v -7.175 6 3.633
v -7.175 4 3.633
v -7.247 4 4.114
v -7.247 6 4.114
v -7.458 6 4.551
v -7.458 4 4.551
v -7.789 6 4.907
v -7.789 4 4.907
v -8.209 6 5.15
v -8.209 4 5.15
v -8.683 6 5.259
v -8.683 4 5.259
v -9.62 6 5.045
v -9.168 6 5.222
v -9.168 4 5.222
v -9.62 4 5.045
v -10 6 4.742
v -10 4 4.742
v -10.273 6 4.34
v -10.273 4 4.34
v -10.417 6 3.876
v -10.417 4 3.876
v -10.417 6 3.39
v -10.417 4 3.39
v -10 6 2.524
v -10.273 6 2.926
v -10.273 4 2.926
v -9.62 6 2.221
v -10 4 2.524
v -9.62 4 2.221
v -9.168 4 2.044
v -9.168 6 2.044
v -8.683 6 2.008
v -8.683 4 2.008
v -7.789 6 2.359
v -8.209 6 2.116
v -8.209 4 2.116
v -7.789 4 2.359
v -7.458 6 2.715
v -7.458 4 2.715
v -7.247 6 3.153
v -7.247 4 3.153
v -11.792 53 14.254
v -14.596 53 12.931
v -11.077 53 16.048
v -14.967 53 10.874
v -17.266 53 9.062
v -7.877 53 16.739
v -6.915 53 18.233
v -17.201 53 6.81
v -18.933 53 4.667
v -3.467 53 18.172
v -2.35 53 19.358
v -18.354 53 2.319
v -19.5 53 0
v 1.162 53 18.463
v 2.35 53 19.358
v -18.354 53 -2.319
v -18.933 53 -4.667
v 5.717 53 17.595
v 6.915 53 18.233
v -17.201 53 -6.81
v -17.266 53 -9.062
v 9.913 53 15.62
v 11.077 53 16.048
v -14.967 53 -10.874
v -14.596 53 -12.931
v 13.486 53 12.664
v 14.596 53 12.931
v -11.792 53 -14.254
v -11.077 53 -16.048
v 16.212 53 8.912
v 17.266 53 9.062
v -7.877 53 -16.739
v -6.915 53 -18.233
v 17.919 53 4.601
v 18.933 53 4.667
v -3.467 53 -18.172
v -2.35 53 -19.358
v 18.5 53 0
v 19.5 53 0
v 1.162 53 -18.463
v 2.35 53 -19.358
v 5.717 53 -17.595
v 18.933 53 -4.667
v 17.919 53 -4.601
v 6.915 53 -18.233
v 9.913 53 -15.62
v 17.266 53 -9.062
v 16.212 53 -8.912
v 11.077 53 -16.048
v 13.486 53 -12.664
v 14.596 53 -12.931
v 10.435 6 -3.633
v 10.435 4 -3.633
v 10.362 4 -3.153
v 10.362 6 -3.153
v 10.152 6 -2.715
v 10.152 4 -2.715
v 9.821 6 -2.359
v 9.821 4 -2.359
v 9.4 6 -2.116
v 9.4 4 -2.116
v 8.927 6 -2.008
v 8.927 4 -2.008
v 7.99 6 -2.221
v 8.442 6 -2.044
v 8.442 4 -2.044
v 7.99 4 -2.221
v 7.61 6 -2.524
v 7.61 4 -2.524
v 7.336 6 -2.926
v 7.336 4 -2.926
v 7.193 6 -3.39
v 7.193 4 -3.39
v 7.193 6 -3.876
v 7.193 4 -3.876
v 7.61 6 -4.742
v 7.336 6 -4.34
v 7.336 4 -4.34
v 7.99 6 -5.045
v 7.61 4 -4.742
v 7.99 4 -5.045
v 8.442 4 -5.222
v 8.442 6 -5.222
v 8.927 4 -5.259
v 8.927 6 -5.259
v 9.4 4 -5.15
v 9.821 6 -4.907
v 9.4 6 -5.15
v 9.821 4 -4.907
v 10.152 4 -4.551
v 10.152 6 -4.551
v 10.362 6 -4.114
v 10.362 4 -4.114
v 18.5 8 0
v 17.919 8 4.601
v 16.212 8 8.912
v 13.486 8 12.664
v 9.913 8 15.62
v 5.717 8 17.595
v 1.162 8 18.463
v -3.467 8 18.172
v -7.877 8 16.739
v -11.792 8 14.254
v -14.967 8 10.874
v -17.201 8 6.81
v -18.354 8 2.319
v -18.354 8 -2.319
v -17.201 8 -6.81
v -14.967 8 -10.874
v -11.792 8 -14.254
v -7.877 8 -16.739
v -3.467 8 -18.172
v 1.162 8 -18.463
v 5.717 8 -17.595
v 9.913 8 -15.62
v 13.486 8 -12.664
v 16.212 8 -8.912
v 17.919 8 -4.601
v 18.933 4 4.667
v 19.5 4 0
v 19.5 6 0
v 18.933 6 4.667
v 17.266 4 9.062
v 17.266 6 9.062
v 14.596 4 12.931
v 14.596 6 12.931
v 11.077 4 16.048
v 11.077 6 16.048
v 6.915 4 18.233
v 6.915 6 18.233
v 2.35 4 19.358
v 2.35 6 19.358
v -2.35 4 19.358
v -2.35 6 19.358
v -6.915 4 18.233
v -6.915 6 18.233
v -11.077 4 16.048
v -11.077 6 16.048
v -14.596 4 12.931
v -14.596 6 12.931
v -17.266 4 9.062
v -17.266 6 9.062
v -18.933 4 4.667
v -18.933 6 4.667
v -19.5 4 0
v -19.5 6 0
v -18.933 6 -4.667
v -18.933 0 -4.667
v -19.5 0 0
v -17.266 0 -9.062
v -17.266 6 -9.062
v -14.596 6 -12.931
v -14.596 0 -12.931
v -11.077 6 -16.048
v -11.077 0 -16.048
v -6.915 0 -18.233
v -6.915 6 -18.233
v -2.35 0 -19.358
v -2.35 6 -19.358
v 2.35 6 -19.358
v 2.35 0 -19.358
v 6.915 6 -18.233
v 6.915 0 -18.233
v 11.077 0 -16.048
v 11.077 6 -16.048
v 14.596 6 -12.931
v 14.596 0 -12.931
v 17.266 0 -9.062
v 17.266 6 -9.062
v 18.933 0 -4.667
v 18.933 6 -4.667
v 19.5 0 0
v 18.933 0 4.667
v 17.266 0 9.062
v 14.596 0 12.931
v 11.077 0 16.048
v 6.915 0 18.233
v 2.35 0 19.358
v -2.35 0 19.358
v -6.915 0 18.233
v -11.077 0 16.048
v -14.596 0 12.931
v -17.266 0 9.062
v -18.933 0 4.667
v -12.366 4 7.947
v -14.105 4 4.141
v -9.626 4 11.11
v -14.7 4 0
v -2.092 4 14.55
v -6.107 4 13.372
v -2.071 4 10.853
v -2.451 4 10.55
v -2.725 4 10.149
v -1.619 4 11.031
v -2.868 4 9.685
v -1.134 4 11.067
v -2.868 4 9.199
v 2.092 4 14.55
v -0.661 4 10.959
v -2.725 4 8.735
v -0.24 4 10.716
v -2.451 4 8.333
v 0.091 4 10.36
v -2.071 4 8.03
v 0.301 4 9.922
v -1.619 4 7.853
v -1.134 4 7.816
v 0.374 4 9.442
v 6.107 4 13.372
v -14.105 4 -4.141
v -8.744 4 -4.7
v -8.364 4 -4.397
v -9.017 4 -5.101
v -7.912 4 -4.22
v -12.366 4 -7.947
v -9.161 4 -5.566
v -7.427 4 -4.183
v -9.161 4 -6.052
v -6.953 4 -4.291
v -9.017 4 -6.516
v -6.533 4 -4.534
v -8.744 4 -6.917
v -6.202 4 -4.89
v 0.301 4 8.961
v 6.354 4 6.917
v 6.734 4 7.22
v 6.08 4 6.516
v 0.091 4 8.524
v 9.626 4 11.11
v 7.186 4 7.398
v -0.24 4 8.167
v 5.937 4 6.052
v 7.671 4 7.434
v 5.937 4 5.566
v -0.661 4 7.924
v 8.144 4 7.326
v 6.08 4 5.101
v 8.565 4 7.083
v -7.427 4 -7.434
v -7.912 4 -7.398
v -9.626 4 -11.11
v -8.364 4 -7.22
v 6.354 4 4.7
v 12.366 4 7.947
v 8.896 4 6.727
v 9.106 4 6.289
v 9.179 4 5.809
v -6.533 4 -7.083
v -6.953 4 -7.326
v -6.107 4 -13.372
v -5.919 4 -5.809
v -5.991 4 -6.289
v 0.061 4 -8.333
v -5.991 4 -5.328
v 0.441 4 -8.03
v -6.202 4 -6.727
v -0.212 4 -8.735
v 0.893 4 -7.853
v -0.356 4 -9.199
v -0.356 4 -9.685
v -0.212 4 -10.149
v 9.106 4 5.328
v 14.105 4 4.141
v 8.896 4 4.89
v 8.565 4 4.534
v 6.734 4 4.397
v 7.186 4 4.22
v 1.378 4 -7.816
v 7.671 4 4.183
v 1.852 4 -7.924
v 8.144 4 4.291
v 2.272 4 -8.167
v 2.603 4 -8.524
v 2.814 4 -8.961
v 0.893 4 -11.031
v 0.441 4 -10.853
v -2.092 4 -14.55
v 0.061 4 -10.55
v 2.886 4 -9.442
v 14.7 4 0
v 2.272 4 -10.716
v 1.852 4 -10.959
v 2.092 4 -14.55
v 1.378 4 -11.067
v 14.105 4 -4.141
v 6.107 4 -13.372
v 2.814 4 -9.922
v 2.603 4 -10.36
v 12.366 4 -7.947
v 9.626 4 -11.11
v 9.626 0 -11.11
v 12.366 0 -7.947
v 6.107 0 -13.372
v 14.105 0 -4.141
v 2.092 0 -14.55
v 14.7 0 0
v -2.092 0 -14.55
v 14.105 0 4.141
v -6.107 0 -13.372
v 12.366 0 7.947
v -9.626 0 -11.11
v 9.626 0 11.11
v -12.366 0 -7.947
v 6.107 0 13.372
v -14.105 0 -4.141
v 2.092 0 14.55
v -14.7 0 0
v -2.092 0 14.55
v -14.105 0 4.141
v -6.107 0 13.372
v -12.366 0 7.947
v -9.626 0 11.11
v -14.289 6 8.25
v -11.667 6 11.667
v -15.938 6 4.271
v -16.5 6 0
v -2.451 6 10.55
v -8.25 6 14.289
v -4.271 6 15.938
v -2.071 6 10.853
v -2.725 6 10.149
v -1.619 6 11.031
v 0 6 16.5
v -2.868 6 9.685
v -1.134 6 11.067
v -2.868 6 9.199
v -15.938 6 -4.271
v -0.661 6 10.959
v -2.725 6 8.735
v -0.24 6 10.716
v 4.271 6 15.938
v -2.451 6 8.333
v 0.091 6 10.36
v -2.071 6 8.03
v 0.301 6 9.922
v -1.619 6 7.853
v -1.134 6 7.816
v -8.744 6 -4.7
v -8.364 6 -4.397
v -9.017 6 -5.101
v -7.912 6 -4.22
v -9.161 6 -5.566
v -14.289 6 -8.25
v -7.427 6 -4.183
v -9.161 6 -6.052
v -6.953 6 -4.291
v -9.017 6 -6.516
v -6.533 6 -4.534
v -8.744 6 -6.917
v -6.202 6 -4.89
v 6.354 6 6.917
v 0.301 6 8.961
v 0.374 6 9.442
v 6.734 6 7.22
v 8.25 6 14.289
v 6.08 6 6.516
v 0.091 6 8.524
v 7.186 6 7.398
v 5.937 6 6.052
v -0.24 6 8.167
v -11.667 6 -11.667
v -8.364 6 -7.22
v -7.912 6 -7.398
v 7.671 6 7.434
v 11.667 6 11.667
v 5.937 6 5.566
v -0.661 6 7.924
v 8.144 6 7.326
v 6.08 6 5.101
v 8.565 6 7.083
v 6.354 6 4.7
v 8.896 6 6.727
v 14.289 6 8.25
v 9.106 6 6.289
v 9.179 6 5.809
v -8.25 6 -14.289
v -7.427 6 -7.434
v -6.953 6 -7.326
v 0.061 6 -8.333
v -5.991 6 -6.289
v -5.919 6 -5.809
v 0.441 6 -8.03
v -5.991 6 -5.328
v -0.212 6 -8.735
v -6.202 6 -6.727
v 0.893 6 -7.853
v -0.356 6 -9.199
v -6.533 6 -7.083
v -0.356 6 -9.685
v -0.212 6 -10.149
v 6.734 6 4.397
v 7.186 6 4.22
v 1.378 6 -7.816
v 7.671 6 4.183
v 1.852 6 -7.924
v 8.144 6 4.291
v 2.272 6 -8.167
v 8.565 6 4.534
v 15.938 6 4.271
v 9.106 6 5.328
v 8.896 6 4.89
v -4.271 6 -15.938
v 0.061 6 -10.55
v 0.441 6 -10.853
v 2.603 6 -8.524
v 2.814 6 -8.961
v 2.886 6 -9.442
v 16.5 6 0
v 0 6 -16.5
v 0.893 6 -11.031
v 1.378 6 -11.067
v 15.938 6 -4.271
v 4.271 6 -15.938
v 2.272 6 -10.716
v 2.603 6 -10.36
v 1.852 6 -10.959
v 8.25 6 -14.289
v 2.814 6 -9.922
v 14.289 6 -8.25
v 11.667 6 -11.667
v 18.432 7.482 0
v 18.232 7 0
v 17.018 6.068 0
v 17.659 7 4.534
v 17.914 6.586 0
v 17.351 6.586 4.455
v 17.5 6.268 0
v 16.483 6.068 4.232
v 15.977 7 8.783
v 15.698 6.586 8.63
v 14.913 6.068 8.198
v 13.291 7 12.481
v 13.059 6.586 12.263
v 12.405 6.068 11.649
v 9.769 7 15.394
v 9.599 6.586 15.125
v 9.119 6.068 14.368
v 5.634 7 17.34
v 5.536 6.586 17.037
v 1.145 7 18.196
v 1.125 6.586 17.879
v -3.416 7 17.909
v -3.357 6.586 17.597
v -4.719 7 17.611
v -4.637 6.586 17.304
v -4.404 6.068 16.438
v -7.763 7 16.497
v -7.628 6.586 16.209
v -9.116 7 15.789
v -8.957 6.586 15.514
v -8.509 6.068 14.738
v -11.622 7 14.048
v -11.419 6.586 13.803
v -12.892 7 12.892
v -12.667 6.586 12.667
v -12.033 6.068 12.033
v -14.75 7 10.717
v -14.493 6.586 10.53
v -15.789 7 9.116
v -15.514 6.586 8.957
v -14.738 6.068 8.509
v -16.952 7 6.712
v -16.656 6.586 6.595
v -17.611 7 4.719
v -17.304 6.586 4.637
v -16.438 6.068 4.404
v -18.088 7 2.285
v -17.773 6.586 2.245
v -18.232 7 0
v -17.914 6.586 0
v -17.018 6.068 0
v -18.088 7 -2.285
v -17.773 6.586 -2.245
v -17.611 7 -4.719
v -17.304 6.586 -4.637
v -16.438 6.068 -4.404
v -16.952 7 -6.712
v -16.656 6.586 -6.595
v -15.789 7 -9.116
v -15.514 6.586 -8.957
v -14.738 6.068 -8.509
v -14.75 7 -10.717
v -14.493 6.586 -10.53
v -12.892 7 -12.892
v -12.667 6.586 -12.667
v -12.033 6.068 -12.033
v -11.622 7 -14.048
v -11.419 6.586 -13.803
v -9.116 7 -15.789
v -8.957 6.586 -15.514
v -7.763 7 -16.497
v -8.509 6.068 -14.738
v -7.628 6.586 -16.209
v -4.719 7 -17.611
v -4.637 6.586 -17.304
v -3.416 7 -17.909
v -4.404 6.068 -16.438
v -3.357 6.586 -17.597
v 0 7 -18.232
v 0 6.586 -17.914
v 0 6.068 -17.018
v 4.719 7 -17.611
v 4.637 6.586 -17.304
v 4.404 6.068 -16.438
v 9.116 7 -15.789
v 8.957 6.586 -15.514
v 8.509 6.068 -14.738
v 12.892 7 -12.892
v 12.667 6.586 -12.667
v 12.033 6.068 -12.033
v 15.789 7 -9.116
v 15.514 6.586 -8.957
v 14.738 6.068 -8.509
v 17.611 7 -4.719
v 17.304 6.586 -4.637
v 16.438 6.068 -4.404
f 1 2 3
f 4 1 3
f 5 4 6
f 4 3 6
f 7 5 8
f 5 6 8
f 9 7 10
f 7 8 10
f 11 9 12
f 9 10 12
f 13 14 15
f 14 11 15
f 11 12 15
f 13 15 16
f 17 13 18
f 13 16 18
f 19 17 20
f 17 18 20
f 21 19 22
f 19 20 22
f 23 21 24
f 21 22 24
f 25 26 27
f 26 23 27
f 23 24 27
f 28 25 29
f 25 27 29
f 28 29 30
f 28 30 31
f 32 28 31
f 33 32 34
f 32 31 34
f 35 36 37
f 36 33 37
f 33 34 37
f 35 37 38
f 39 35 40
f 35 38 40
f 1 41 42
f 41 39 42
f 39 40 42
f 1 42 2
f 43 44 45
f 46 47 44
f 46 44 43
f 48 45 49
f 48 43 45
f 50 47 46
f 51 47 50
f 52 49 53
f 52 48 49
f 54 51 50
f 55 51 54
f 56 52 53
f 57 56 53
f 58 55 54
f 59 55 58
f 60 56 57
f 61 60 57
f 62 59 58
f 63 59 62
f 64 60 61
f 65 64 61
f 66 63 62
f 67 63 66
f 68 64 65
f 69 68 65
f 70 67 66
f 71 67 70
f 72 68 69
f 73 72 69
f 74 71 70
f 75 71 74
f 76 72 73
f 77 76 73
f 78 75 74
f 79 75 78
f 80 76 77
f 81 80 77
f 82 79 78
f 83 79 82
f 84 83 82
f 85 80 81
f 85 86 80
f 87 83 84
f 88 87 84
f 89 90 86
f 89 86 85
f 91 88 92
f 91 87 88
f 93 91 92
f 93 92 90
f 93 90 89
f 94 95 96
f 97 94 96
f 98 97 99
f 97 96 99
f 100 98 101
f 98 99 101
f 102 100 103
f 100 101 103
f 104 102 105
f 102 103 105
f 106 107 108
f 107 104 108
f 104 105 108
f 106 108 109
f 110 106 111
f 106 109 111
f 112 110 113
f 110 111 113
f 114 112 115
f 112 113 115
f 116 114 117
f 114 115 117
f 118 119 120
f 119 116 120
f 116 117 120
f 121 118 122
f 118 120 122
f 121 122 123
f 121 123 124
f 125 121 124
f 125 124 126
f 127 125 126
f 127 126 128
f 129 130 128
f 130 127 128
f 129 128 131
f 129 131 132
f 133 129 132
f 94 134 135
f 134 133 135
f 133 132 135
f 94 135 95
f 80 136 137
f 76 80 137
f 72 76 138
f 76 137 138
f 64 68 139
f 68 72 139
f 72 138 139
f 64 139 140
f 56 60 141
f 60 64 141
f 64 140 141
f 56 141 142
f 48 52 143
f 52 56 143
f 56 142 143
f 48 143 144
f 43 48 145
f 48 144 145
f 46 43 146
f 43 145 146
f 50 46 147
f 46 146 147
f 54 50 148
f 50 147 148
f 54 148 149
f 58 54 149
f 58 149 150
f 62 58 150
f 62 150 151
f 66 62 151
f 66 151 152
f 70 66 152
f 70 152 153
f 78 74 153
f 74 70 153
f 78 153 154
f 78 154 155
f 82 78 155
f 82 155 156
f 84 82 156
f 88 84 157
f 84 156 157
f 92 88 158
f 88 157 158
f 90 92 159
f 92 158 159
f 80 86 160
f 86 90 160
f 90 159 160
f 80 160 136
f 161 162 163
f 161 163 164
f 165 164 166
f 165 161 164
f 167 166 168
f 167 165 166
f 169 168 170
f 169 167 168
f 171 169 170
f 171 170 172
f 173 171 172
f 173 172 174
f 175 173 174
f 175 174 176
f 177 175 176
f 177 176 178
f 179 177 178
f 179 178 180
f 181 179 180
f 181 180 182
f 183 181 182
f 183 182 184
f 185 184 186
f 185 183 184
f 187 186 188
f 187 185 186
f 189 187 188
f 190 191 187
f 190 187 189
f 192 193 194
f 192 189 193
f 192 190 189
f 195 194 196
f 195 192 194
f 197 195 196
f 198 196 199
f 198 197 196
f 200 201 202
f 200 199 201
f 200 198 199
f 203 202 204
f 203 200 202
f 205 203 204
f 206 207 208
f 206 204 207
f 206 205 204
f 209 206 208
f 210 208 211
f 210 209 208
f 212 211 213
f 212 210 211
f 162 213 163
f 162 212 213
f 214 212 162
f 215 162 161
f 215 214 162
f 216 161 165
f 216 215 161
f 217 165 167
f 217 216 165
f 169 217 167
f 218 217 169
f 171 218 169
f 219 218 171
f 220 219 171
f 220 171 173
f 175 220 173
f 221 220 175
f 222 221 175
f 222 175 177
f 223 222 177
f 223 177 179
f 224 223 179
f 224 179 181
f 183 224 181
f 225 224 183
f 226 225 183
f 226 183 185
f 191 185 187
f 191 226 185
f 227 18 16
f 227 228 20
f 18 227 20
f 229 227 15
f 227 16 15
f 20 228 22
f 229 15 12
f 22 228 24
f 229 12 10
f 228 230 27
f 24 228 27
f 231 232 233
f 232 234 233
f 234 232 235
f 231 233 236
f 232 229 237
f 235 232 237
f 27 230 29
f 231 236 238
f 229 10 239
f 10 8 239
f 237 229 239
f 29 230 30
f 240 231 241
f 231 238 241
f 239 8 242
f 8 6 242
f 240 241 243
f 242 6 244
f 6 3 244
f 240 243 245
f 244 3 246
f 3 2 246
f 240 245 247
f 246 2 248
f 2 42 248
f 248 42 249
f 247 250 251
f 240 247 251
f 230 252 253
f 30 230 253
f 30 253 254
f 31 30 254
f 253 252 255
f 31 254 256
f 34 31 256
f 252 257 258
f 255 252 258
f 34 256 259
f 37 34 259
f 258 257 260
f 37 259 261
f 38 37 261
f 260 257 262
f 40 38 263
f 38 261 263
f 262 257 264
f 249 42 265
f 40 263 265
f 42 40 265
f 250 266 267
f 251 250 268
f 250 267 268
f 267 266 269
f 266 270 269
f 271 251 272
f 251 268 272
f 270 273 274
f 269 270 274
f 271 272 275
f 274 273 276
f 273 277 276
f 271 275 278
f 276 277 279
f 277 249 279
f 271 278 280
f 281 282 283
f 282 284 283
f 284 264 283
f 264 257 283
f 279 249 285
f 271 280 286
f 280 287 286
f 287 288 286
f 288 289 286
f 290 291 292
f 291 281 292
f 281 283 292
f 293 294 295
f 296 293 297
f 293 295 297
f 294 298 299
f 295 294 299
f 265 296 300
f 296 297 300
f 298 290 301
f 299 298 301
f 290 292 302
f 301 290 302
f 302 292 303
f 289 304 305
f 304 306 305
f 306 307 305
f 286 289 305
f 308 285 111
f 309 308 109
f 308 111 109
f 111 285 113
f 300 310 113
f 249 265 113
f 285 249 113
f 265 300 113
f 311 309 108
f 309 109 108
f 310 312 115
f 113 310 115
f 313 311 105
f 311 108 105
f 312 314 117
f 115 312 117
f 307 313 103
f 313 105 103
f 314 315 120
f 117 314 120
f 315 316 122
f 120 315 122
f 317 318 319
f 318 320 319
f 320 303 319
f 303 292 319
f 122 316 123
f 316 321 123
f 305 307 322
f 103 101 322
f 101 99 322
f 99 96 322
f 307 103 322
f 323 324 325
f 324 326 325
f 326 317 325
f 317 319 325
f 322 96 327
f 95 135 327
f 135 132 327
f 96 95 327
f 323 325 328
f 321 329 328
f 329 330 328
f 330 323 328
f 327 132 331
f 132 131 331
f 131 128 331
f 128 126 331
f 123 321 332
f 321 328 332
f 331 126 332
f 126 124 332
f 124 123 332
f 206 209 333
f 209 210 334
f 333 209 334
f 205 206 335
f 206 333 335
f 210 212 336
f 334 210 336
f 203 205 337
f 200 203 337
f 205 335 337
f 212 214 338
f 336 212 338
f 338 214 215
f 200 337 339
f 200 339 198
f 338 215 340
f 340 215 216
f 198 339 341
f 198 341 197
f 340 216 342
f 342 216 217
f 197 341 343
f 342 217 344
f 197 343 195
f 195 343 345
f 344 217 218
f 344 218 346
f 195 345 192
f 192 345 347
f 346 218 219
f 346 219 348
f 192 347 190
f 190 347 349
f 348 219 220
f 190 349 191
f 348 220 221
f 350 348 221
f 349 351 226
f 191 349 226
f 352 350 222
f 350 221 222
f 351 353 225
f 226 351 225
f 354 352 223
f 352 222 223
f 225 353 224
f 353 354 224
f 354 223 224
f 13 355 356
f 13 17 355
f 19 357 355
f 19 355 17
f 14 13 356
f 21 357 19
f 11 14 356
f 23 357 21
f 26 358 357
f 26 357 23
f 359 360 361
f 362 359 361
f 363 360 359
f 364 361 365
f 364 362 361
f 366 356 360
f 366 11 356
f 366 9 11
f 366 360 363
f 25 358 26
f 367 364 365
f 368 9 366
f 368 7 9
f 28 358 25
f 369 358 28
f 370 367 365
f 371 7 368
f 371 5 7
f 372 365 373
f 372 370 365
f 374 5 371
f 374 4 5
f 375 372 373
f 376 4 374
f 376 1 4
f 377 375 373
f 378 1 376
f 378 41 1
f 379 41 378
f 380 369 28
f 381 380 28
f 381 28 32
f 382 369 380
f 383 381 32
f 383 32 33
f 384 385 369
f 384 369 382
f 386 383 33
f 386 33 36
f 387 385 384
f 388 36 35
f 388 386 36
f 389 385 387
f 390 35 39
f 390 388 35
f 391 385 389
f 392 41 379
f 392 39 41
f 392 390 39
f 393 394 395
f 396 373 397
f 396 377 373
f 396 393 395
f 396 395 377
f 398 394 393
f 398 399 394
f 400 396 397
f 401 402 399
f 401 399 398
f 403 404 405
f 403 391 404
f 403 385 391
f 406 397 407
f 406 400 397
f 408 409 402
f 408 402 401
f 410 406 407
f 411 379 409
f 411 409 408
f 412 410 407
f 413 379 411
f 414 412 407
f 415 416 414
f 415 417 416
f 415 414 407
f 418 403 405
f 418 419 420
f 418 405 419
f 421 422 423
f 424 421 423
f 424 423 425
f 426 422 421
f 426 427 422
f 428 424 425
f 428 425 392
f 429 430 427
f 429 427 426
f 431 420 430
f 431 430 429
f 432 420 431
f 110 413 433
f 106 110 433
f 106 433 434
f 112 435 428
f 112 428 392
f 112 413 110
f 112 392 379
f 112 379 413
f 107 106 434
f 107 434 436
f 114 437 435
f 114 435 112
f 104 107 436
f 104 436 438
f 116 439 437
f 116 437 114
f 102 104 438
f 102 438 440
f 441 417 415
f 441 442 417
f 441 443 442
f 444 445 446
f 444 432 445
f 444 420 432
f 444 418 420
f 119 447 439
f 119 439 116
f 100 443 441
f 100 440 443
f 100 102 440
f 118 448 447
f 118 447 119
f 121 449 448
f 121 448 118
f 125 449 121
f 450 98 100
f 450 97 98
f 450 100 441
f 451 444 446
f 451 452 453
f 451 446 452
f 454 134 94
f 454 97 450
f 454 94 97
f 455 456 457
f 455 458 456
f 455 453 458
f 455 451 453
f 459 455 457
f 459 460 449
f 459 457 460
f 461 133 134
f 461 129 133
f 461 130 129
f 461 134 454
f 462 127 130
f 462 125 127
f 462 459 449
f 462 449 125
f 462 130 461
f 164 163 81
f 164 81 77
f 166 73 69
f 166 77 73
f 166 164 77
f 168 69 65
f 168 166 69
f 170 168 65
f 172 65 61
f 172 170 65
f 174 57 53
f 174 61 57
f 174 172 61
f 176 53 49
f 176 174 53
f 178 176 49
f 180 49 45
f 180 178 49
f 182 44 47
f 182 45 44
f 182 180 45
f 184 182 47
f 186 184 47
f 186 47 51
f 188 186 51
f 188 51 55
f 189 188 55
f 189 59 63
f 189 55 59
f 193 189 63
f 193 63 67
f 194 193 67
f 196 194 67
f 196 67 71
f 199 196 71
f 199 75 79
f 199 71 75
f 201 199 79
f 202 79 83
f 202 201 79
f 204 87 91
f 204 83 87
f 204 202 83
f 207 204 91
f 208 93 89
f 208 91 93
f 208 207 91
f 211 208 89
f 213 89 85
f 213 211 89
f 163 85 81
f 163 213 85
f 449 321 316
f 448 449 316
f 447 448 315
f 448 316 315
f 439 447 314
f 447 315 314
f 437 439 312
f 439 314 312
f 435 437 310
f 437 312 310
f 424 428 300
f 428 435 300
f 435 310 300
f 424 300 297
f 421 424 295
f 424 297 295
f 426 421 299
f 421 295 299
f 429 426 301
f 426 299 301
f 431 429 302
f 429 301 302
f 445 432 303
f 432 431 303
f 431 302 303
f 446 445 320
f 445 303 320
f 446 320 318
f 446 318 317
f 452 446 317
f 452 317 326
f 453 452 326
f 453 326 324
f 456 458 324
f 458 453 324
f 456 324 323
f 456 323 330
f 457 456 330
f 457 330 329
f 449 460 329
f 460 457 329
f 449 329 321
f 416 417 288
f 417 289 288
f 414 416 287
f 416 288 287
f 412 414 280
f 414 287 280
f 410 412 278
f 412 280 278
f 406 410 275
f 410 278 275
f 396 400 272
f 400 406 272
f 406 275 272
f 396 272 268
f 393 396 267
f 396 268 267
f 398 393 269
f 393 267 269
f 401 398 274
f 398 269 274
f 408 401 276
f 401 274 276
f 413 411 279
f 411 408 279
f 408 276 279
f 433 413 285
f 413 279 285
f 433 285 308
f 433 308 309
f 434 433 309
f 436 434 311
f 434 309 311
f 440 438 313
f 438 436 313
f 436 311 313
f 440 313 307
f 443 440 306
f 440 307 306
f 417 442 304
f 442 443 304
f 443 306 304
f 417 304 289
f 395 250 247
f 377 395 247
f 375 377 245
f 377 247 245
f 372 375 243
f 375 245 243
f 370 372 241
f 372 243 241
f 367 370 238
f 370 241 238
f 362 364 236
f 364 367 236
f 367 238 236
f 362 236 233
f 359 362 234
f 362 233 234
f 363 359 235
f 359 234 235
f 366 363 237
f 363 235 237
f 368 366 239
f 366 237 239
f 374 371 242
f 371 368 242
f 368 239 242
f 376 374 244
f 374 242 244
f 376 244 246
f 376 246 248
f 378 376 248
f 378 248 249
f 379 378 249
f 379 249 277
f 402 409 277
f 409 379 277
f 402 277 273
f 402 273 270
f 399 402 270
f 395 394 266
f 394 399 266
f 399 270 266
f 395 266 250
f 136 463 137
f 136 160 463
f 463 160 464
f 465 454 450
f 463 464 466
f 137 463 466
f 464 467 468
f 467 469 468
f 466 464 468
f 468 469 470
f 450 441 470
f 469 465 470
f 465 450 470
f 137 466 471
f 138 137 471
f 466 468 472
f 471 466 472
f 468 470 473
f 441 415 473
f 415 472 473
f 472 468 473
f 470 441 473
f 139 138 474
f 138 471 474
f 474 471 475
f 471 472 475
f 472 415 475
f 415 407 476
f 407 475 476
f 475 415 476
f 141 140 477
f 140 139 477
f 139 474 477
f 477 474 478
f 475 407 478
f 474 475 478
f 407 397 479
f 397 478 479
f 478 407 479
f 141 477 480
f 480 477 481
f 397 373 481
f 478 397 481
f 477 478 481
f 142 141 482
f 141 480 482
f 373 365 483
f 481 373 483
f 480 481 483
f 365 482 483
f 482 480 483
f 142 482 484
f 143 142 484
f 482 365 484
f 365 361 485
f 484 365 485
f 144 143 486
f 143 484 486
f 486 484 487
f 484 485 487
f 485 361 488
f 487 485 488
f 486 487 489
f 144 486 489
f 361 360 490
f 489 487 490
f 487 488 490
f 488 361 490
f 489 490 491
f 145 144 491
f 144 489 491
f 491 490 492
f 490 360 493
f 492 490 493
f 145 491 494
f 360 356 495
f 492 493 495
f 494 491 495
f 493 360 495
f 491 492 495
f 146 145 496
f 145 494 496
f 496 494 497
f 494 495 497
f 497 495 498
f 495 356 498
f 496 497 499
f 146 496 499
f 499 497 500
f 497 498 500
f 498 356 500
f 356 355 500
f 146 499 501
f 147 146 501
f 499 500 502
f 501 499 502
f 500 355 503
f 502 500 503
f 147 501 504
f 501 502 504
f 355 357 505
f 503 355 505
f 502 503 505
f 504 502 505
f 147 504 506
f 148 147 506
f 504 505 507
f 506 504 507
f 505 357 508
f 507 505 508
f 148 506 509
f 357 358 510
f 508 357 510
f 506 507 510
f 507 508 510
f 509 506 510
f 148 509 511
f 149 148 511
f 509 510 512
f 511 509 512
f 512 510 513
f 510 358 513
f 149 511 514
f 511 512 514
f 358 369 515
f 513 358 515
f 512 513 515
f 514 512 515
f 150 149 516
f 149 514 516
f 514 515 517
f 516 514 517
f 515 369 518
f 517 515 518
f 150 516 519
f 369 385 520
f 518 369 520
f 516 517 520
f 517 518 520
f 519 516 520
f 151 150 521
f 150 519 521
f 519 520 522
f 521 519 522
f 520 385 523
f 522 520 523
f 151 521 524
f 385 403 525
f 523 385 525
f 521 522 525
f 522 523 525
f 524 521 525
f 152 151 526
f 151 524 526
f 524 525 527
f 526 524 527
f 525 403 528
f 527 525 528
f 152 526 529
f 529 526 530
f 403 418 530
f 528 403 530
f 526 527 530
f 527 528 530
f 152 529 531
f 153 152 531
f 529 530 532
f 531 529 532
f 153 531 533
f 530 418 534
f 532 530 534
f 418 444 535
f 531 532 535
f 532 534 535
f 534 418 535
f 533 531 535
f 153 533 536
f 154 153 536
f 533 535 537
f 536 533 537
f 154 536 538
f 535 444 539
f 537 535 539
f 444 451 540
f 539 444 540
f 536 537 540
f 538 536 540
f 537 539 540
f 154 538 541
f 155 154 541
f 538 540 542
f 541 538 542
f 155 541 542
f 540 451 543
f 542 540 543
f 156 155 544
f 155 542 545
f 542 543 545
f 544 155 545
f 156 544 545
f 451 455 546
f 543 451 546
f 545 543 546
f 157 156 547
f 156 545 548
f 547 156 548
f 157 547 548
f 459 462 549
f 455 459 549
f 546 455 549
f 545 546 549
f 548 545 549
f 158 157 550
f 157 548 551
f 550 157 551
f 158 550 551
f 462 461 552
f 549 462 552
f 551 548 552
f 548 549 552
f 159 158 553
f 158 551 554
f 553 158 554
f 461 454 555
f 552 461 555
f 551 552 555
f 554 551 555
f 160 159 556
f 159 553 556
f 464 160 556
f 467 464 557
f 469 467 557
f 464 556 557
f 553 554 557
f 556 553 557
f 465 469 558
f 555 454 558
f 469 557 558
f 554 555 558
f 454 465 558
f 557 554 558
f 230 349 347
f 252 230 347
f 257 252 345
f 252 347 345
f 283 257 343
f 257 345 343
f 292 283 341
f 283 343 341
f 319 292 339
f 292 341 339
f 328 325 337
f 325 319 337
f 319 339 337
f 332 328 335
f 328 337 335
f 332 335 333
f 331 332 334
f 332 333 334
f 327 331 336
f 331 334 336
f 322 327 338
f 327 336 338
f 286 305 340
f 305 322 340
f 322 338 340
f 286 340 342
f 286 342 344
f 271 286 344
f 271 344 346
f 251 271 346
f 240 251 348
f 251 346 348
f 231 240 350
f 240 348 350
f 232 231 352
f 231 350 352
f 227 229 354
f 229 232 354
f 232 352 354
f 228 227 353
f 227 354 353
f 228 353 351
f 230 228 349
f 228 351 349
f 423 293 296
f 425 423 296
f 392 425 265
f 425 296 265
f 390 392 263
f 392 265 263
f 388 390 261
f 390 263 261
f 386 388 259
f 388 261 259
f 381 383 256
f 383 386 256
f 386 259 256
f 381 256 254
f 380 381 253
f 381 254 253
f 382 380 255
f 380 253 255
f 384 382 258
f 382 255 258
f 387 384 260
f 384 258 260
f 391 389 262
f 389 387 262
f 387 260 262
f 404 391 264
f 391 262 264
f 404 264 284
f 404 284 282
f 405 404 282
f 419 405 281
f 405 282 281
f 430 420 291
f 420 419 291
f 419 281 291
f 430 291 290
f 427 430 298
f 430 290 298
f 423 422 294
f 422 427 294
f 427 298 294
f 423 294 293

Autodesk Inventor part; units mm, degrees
ref_plane "YZ Plane" through (0, 0, 0) normal (1, 0, 0) x (0, 1, 0)
ref_plane "XZ Plane" through (0, 0, 0) normal (0, 1, 0) x (-1, 0, 0)
ref_plane "XY Plane" through (0, 0, 0) normal (0, 0, 1) x (1, 0, 0)
sketch "Sketch1" plane through (0, 0, 0) normal (0, 1, 0) x (-1, 0, 0)
  circle A0 centre (0, 0) radius 22.5
  circle A1 centre (0, 0) radius 19.5
  circle A2 centre (0, 0) radius 12.7 projected
  circle A3 centre (0, 0) radius 6 projected
  circle A4 centre (8.8049, 3.6331) radius 1.63 projected
  circle A5 centre (7.5488, -5.8087) radius 1.63 projected
  circle A6 centre (-1.2561, -9.4418) radius 1.63 projected
  circle A7 centre (-8.8049, -3.6331) radius 1.63 projected
  circle A8 centre (-7.5488, 5.8087) radius 1.63 projected
  circle A9 centre (1.2561, 9.4418) radius 1.63 projected
  circle A10 centre (0, 0) radius 14.7
  dimension "d0" = 45
  dimension "d1" = 3
  dimension "d4" = 2
extrude "Extrusion1" add sketch "Sketch1" along normal blind 4 contours A1
sketch "Sketch2" plane through (0, 4, 0) normal (0, 1, 0) x (1, 0, 0)
  circle A0 centre (0, 0) radius 19.5 projected
  circle A1 centre (0, 0) radius 14.7 projected
  circle A2 centre (-7.5488, 5.8087) radius 1.63 projected
  circle A3 centre (-8.8049, -3.6331) radius 1.63 projected
  circle A4 centre (-1.2561, -9.4418) radius 1.63 projected
  circle A5 centre (7.5488, -5.8087) radius 1.63 projected
  circle A6 centre (8.8049, 3.6331) radius 1.63 projected
  circle A7 centre (1.2561, 9.4418) radius 1.63 projected
  circle A8 centre (0, 0) radius 12.7 projected
extrude "Extrusion2" add sketch "Sketch2" along normal blind 2 contours A0 | A1 | A8
sketch "Sketch3" plane through (0, 6, 0) normal (0, 1, 0) x (1, 0, 0)
  circle A0 centre (0, 0) radius 22.5
  circle A1 centre (0, 0) radius 19.5
  circle A2 centre (0, 0) radius 18.5
  dimension "d7" = 45
  dimension "d8" = 3
  dimension "d9" = 1
extrude "Extrusion3" add sketch "Sketch3" along normal blind 47 contours A1
fillet "Fillet1" radius 2 1 edges at (-18.5, 6, 0)
properties part number "tulejka"
